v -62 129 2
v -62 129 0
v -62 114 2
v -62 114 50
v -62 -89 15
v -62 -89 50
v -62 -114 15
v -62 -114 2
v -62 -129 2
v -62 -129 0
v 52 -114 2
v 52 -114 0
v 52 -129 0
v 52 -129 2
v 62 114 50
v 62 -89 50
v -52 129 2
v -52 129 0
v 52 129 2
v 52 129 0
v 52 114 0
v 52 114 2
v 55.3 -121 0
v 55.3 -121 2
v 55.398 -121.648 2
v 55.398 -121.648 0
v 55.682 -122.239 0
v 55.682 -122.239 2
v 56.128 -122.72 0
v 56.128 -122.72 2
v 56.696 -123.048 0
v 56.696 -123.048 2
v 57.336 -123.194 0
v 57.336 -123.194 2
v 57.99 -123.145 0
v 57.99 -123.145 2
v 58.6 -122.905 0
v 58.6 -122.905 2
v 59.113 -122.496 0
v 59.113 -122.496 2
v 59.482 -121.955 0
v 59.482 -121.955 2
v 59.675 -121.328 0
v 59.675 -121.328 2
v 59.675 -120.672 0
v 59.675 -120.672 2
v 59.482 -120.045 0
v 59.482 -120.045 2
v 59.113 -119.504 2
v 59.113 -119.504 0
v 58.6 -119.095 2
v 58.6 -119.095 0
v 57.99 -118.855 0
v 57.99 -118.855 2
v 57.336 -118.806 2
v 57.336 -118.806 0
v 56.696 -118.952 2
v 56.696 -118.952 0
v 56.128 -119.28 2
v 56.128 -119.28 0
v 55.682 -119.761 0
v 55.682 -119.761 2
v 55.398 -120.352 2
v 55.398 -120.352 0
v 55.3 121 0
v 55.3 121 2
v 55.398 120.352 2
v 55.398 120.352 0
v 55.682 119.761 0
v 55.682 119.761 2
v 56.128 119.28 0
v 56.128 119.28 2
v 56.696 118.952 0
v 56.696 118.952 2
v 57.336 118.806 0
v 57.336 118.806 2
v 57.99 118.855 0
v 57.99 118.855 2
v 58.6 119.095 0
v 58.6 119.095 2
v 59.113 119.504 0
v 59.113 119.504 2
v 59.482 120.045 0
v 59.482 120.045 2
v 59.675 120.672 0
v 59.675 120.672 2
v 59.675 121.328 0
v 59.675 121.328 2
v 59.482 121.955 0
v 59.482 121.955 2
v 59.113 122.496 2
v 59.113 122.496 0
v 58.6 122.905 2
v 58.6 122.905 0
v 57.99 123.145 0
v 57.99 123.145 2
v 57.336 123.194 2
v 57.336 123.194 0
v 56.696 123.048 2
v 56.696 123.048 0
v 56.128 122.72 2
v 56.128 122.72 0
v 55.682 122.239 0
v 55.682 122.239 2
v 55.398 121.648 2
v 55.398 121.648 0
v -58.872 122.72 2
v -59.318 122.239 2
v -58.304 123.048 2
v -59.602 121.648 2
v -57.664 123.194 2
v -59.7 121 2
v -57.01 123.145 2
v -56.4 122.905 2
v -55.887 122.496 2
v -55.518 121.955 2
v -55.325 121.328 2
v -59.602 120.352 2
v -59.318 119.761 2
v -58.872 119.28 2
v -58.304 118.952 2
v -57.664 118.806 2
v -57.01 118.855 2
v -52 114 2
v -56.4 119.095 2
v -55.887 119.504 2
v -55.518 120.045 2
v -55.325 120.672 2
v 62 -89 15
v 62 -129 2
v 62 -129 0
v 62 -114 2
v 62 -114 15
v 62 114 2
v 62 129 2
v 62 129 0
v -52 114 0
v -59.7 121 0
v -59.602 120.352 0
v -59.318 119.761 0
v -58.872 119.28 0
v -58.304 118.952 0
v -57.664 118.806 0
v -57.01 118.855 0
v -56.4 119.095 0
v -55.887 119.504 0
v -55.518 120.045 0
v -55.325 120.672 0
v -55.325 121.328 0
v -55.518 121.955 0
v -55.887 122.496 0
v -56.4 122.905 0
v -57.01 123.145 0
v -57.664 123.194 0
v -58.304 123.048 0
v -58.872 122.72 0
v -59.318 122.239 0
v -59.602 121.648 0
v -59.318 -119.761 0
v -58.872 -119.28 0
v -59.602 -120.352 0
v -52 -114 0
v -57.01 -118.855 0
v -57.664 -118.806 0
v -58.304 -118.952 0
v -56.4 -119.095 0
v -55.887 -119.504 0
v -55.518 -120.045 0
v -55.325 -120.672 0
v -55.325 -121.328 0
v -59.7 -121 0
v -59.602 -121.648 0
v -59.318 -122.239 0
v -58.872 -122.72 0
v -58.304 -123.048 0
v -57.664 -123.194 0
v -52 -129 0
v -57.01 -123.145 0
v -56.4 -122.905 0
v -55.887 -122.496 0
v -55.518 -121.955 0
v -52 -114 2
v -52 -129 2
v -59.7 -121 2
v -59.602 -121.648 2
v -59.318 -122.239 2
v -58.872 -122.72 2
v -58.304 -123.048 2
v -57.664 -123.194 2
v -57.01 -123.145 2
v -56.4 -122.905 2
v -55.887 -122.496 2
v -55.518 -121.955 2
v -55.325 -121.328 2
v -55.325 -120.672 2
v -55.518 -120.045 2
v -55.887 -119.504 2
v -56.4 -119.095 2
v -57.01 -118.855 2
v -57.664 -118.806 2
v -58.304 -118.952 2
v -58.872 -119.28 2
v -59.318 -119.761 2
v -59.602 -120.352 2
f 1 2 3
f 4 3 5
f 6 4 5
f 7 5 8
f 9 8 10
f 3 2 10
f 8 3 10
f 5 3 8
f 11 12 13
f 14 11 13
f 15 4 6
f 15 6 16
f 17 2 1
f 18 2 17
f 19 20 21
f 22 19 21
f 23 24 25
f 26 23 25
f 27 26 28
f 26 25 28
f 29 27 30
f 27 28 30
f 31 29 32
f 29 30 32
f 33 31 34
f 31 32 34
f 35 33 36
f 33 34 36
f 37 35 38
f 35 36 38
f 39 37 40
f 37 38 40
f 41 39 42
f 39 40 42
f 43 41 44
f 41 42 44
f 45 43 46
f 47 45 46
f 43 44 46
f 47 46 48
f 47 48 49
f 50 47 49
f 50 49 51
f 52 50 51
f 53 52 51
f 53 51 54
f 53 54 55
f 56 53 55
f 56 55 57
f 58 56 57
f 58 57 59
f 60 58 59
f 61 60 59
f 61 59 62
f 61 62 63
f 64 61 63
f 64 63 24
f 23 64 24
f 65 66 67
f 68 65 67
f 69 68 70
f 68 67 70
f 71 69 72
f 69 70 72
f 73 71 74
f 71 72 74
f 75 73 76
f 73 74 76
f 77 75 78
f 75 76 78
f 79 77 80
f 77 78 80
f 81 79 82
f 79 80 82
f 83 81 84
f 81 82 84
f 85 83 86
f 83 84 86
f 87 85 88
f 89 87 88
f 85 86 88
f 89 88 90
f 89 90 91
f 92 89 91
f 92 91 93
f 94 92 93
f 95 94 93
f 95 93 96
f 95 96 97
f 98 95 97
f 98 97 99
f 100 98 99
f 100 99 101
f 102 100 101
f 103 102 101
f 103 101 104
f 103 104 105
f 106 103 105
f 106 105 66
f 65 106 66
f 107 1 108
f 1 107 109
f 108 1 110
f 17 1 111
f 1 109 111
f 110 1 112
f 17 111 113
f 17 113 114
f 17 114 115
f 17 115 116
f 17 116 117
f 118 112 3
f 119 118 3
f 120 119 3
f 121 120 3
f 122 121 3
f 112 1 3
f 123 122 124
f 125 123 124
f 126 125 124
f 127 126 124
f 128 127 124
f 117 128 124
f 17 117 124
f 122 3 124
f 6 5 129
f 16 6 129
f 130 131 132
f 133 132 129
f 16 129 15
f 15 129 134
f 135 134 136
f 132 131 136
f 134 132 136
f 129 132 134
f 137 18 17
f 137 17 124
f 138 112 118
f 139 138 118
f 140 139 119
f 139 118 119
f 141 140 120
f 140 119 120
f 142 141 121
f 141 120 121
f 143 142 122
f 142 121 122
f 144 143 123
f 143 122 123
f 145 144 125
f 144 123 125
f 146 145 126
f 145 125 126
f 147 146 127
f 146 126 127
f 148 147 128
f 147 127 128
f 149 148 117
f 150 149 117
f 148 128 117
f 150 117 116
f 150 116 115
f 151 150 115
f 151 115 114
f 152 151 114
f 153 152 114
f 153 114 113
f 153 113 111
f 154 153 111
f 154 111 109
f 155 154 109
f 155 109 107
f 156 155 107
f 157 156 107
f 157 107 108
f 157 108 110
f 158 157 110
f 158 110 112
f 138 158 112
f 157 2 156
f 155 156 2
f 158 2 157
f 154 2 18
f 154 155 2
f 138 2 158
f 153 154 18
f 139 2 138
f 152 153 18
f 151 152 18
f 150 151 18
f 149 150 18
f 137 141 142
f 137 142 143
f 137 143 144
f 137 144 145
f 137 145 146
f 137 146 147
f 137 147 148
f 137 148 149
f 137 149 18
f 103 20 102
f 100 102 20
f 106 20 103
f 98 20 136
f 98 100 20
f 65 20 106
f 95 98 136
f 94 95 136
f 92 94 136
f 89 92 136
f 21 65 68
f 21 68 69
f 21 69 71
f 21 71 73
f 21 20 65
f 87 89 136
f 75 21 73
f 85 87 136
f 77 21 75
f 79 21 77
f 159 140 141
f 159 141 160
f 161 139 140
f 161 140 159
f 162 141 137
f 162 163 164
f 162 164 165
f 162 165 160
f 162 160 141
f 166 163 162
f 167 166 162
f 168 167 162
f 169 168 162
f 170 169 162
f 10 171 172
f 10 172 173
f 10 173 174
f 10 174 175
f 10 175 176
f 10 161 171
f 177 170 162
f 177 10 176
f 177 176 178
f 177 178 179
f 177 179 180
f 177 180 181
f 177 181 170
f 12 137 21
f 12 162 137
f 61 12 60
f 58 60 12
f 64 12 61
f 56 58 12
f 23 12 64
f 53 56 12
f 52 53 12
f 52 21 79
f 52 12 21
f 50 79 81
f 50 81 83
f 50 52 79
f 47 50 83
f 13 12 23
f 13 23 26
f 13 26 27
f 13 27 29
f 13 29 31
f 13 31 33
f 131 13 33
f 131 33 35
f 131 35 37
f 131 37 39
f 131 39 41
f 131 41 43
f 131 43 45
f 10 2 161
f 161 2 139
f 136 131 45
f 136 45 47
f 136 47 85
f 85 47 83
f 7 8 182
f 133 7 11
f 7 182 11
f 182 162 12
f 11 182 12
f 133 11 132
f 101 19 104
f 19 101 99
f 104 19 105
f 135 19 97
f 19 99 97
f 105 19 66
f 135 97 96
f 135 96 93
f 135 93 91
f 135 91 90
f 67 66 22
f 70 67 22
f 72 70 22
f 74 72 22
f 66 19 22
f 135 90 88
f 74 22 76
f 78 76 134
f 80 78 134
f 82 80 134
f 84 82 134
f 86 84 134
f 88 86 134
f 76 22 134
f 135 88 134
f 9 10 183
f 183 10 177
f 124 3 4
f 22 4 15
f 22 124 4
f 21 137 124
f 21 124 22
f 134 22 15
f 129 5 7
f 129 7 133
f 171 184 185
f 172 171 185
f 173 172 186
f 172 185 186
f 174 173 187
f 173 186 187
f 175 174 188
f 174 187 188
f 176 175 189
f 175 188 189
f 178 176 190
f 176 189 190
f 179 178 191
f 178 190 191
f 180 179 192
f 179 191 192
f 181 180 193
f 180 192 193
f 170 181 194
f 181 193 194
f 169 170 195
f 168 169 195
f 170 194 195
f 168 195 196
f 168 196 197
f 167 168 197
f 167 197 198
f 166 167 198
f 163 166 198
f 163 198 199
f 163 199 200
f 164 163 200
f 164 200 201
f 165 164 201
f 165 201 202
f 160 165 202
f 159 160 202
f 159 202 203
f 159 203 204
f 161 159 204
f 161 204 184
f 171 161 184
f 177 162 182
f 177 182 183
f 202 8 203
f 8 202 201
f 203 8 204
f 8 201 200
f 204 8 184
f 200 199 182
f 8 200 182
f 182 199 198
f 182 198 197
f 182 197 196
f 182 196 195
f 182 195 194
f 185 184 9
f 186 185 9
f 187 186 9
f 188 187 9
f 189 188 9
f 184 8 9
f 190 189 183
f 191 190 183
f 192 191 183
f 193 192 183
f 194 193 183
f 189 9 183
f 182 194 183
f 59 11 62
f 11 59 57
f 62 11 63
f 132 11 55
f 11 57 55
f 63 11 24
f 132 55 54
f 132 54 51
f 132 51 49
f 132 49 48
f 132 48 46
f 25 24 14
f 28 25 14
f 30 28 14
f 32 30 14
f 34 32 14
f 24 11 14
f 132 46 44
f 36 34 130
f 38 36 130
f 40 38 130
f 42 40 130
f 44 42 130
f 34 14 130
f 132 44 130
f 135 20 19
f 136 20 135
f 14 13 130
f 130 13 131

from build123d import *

# Parameters (mm, degrees)
F0_W     = 124
F0_H     = 228
F1_DEPTH = 15
F2_W     = 124
F2_H     = 203
F3_DEPTH = 35
F5_W     = 10
F5_H     = 15
F6_DEPTH = 2
F7_D     = 4.4


with BuildPart() as f1:
    # F0 (on Top) → F1 (new body)
    with BuildSketch(Plane.XY):
        Rectangle(F0_W, F0_H)
    extrude(amount=F1_DEPTH)

    # F2 (on face) → F3 (join)
    with BuildSketch(Plane.XY.offset(15)):
        with Locations((0, 12.5)):
            Rectangle(F2_W, F2_H)
    extrude(amount=F3_DEPTH)

    # F5 (on face) → F6 (join)
    with BuildSketch(Plane(origin=(0, 0, 0), x_dir=(1, 0, 0), z_dir=(0, 0, -1))):
        with Locations((-57, 121.5)):
            Rectangle(F5_W, F5_H)
        with Locations((57, 121.5)):
            Rectangle(F5_W, F5_H)
        with Locations((57, -121.5)):
            Rectangle(F5_W, F5_H)
        with Locations((-57, -121.5)):
            Rectangle(F5_W, F5_H)
    extrude(amount=-F6_DEPTH)

    # F7 (through all)
    with Locations(Plane(origin=(0, 0, 0), x_dir=(1, 0, 0), z_dir=(0, 0, -1))):
        with Locations((57.5, -121), (-57.5, -121), (-57.5, 121), (57.5, 121)):
            Hole(F7_D / 2)


solid = f1.part
